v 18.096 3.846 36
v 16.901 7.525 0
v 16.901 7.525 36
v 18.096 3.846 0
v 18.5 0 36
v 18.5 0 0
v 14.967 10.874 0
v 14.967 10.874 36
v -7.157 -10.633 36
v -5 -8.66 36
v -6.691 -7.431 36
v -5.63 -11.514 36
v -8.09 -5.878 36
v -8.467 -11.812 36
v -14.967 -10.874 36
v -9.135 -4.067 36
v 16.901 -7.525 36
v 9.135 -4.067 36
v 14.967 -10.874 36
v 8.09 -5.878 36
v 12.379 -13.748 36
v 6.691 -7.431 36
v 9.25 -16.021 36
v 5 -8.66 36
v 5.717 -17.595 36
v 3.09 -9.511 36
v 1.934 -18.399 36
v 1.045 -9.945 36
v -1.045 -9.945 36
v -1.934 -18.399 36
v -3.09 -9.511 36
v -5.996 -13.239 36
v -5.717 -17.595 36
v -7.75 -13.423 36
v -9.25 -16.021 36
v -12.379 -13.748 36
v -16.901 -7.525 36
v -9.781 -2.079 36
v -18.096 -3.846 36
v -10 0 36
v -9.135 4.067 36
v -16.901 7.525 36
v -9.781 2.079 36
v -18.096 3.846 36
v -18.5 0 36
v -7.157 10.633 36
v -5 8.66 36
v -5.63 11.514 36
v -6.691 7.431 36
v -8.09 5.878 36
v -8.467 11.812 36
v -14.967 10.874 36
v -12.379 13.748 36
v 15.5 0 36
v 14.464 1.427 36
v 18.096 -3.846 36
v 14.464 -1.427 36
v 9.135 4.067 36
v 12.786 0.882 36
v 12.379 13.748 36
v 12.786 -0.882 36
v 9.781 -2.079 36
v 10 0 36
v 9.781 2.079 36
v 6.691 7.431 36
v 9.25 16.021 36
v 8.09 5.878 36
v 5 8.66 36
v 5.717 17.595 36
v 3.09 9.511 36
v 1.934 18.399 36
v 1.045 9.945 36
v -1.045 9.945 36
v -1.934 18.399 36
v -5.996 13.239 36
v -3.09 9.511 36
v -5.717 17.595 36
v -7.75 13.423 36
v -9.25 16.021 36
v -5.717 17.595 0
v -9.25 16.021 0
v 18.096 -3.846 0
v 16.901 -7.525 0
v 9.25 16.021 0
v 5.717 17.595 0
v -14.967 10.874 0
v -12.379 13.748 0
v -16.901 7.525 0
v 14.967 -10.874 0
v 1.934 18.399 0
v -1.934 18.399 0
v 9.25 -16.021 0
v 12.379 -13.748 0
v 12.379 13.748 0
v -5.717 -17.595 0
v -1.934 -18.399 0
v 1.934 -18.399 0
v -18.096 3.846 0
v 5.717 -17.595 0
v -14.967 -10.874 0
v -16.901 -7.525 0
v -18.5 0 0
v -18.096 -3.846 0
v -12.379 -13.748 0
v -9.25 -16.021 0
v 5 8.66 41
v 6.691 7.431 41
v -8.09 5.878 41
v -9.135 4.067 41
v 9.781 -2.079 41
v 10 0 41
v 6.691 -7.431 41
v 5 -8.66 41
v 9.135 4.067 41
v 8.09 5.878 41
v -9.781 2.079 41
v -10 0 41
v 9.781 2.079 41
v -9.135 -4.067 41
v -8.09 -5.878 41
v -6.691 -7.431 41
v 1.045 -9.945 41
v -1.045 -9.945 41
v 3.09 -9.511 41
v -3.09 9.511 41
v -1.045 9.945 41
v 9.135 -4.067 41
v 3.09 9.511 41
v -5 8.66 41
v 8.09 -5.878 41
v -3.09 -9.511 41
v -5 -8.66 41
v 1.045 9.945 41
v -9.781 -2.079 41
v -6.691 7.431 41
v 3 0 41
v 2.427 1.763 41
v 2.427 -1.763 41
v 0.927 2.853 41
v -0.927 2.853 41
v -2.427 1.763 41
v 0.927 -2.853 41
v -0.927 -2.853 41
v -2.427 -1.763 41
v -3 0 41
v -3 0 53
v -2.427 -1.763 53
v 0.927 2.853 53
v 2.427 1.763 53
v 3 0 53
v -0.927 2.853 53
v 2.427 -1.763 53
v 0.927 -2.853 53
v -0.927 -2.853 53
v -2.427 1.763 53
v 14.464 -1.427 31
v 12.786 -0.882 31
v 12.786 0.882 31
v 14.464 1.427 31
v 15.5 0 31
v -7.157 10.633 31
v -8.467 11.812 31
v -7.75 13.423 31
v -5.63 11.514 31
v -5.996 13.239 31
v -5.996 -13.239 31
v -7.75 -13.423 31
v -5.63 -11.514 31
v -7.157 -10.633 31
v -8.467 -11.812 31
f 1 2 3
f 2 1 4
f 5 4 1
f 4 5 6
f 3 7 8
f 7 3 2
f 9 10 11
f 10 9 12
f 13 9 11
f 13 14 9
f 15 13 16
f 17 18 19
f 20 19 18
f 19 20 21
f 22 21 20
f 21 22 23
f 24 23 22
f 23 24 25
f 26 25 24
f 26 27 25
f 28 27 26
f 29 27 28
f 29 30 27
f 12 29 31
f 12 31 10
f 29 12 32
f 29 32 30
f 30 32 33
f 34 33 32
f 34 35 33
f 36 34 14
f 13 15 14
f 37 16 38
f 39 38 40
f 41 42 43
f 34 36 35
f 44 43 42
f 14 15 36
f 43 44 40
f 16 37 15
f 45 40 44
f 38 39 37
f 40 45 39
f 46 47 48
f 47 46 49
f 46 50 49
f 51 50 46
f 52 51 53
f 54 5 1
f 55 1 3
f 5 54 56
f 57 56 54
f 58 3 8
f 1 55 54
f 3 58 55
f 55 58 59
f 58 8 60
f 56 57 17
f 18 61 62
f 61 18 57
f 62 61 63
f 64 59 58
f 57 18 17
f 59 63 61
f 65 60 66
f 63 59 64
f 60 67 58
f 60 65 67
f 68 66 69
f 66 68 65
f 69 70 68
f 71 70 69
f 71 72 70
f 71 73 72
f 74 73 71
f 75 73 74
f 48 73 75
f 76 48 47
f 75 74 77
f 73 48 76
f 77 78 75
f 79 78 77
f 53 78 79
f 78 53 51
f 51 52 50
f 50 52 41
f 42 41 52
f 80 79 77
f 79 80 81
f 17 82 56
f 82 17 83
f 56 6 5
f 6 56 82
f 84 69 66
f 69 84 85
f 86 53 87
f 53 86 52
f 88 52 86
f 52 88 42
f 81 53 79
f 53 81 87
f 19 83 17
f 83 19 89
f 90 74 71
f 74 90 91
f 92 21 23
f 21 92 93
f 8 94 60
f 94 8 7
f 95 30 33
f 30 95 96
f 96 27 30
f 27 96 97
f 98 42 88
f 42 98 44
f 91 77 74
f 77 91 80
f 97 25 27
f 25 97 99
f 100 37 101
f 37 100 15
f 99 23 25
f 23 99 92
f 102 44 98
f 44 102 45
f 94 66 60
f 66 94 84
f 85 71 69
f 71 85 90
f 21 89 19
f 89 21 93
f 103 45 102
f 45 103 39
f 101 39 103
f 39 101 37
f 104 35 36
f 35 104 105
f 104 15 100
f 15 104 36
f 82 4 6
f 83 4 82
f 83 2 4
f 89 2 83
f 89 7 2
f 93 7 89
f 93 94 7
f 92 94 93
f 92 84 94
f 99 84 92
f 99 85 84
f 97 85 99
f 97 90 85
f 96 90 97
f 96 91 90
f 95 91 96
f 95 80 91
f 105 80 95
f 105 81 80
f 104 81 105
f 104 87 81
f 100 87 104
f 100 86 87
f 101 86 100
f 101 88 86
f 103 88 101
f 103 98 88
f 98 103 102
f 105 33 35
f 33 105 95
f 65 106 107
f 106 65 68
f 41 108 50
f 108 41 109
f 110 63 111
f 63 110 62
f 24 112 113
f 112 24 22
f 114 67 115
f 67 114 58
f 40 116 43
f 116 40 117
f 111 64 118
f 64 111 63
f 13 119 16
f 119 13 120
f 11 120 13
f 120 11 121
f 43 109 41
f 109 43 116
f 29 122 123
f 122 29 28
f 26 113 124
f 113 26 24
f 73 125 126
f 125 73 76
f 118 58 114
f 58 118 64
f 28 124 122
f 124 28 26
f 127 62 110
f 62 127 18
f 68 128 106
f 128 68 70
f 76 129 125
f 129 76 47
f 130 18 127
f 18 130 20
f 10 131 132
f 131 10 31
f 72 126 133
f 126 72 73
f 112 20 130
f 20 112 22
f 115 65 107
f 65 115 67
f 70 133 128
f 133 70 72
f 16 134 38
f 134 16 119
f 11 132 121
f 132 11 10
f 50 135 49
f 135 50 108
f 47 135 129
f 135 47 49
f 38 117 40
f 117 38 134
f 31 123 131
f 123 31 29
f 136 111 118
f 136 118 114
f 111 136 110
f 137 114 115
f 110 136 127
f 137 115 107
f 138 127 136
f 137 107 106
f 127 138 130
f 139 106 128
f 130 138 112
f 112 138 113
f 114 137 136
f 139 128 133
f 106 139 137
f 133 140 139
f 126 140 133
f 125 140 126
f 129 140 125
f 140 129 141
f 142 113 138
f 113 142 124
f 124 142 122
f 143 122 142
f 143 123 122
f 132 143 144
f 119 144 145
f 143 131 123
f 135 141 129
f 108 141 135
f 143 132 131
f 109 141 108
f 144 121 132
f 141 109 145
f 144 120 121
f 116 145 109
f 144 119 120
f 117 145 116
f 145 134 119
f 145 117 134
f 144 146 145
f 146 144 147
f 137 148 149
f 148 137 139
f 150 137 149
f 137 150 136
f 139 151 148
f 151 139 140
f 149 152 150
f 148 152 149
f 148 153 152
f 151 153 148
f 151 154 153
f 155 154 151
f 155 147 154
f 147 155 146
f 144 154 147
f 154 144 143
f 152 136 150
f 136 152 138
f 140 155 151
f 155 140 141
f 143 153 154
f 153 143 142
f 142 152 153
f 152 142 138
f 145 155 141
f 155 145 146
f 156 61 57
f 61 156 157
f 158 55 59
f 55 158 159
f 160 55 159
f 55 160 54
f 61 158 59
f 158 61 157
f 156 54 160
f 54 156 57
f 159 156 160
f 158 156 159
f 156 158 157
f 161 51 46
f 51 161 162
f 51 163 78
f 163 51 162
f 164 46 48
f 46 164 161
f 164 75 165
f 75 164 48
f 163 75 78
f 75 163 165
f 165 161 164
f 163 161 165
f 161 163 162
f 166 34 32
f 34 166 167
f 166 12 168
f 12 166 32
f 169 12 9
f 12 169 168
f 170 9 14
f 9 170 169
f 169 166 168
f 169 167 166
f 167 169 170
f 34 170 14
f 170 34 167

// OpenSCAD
module tube(l, ri, ro){
    difference(){
        cylinder(l, ro, ro);
        translate([0,0,-0.1])
        cylinder(l+0.2, ri, ri);
    }
}

module encoderScrewHoles(r,h){
    for(i=[0:2]){
        rotate([0,0,i*120])
            translate([36/2-4, 0,0])
                cylinder(h, r, r);
    }
}

module encoderShaftHole(t){
    cylinder(t,21.5/2, 21.5/2);
}

module encoderBody(){
    cylinder(36, 37/2, 37/2);
    translate([0,0,36])
        cylinder(5,20/2, 20/2);
    translate([0,0,36+5])
        cylinder(12,6/2, 6/2);
    
}

module encoderWithHoles(){
    difference(){
        encoderBody();
        translate([0,0,36-5])
            encoderScrewHoles(3/2, 6);
    }
}

encoderWithHoles();
